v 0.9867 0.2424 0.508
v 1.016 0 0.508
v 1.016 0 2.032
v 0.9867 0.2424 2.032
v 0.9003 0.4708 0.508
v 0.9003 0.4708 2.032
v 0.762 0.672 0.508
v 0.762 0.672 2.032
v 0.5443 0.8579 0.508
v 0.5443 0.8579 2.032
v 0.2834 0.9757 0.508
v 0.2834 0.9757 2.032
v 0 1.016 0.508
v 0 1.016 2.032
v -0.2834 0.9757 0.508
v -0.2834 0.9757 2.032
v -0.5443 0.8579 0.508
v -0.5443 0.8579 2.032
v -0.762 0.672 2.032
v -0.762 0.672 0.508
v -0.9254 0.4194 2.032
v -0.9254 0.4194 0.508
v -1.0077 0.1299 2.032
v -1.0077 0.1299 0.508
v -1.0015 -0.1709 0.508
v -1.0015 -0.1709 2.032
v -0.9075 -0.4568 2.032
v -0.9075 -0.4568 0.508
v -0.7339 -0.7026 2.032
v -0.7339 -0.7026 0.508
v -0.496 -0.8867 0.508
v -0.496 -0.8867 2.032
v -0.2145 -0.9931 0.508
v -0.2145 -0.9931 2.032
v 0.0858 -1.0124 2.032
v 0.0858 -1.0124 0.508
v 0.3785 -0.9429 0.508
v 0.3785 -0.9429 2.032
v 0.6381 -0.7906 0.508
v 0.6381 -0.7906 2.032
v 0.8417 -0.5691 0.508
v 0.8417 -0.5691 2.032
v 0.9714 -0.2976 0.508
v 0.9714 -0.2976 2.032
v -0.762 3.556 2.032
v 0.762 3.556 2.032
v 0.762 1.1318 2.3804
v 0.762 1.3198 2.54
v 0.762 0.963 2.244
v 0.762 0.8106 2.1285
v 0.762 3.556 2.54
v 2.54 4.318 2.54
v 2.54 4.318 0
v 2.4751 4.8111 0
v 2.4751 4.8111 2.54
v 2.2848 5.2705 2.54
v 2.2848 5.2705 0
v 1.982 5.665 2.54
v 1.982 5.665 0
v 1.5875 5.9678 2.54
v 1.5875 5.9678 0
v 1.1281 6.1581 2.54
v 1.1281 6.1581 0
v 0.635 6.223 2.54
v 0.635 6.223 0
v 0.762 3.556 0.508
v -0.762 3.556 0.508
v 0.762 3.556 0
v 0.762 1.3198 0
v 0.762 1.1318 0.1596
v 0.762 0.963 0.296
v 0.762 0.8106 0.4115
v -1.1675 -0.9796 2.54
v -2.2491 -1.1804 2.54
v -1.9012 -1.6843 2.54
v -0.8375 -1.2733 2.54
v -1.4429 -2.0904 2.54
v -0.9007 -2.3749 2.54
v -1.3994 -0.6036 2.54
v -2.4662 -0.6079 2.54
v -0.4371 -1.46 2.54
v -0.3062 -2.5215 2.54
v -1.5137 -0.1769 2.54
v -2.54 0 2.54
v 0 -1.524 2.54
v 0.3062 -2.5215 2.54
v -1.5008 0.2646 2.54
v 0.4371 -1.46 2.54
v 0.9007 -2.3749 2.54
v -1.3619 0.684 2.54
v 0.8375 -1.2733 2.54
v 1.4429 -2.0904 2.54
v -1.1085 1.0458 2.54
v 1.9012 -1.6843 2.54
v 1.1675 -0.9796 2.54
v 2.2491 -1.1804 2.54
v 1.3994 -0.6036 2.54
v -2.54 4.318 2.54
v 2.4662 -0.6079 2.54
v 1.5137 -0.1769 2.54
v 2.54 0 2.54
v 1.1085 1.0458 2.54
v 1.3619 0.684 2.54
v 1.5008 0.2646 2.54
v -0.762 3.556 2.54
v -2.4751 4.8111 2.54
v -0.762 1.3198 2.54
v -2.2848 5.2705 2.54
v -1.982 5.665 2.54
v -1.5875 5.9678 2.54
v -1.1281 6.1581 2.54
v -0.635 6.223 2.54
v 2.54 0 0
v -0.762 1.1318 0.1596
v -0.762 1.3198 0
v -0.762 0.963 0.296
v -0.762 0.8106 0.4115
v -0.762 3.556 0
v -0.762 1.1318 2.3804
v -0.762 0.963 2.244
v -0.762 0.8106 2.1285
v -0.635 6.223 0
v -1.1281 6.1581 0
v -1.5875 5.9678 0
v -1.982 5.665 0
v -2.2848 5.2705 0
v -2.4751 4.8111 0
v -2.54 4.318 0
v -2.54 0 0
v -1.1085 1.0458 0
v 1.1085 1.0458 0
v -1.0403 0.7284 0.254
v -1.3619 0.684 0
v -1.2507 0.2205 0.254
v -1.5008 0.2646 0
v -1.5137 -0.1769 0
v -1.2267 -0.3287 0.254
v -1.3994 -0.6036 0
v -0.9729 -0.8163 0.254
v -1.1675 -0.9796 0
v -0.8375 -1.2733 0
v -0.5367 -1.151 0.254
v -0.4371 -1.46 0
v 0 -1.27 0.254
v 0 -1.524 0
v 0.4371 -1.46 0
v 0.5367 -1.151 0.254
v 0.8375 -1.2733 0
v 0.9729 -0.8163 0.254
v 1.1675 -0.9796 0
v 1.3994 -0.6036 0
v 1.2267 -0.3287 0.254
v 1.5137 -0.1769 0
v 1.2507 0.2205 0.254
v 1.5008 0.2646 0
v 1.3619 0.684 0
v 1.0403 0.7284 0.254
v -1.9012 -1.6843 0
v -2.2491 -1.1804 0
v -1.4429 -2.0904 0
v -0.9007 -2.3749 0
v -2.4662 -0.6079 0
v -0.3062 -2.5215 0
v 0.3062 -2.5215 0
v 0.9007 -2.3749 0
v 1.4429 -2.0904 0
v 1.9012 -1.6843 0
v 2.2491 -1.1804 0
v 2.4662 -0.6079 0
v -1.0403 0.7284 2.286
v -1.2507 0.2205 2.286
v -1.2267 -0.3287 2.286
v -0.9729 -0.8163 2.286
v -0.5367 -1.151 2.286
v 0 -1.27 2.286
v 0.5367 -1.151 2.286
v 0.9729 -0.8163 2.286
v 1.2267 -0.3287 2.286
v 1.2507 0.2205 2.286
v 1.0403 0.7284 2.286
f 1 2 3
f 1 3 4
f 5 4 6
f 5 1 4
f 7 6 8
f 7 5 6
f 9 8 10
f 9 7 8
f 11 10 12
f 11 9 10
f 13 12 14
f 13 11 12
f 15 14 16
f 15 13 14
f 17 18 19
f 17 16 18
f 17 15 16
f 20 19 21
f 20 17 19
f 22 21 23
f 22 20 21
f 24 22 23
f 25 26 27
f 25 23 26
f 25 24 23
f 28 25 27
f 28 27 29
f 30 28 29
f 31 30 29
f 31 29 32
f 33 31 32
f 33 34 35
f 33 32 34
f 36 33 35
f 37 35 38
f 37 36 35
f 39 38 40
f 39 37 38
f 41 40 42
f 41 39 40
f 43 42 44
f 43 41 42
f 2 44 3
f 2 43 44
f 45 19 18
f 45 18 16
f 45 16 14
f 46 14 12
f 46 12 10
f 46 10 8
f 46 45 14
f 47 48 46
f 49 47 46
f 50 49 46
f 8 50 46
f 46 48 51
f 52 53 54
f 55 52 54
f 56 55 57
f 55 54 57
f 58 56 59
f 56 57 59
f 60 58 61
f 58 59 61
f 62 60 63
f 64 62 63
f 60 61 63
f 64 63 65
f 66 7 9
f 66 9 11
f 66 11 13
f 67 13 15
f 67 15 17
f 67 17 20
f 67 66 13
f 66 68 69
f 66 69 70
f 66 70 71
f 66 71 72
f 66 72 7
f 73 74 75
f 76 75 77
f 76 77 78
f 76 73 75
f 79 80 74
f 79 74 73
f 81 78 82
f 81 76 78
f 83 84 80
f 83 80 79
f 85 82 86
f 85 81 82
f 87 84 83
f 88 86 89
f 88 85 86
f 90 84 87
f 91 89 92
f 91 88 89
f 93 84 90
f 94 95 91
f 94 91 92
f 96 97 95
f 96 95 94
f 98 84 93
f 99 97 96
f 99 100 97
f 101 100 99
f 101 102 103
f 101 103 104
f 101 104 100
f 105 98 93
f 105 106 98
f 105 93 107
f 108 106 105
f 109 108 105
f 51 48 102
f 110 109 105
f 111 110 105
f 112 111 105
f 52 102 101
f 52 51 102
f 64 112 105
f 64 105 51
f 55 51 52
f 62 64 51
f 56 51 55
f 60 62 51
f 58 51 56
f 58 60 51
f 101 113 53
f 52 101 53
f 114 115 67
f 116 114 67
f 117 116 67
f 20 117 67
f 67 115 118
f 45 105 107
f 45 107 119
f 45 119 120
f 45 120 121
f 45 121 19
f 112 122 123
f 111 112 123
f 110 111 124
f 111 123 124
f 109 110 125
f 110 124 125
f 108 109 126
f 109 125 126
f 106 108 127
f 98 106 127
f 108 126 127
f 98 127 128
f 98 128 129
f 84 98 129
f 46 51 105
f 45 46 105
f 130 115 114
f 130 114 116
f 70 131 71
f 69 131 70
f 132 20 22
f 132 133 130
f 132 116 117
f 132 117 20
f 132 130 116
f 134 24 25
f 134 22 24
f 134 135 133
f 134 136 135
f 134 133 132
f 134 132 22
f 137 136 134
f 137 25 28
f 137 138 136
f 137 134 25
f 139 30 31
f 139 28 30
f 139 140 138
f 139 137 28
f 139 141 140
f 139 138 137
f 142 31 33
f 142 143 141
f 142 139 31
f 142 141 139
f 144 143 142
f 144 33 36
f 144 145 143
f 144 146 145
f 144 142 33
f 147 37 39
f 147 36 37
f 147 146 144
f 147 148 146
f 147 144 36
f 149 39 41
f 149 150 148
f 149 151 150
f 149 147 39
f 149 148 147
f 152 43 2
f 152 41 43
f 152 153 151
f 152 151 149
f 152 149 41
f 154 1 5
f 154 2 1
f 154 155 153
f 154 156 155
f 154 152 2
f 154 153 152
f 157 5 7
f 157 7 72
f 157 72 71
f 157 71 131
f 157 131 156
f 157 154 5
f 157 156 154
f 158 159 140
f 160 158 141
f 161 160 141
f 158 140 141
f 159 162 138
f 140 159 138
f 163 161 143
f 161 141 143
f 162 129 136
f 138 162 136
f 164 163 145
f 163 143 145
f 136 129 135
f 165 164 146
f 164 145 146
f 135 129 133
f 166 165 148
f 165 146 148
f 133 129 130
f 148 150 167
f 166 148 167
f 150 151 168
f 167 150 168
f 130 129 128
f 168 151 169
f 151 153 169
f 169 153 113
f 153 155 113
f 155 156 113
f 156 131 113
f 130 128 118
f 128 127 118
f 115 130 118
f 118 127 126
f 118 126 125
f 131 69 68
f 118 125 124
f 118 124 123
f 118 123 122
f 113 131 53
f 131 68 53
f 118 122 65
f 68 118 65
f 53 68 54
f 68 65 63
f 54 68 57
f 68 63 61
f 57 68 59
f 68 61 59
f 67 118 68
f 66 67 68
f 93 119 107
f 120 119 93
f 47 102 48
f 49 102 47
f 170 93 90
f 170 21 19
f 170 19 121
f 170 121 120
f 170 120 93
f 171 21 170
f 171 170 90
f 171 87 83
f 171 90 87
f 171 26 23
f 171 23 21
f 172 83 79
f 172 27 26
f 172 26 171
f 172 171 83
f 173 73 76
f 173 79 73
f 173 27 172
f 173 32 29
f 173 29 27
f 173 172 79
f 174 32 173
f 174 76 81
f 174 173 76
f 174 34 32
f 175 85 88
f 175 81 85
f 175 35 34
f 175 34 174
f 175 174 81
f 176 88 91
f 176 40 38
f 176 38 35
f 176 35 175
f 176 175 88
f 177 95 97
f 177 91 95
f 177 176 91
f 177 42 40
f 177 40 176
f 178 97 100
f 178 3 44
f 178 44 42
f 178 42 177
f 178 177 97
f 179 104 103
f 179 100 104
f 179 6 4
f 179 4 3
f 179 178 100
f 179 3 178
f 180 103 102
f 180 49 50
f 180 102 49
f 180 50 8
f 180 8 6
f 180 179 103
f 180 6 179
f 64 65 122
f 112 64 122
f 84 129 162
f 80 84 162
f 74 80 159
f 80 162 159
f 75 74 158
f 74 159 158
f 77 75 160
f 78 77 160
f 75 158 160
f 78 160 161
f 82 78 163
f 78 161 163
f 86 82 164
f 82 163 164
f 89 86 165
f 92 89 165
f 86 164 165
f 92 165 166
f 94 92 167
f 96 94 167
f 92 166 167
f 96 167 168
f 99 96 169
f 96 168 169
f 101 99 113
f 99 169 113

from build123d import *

# Parameters (mm, degrees)
SKETCH2_R           = 1.016
BOSS_EXTRUDE2_DEPTH = 2.54
CUT_EXTRUDE1_DEPTH  = 0.508
CUT_EXTRUDE2_DEPTH  = 0.508


with BuildPart() as part:
    # Sketch2 → Boss-Extrude2 (new body)
    with BuildSketch(Plane.XY):
        with BuildLine():
            ThreePointArc((-2.54, 0), (0, -2.54), (2.54, 0))
            Line((2.54, 0), (2.54, 4.318))
            ThreePointArc((2.54, 4.318), (1.982038418, 5.665038418), (0.635, 6.223))
            Line((0.635, 6.223), (-0.635, 6.223))
            ThreePointArc((-0.635, 6.223), (-1.982038418, 5.665038418), (-2.54, 4.318))
            Line((-2.54, 4.318), (-2.54, 0))
        make_face()
        Circle(SKETCH2_R, mode=Mode.SUBTRACT)
    extrude(amount=BOSS_EXTRUDE2_DEPTH)

    # Sketch3 → Cut-Extrude1 (cut)
    with BuildSketch(Plane.XY.offset(2.54)):
        with BuildLine():
            Line((-0.762, 2.423005572), (-0.762, 1.319822715))
            ThreePointArc((-0.762, 1.319822715), (0, 1.524), (0.762, 1.319822715))
            Line((0.762, 1.319822715), (0.762, 2.423005572))
            ThreePointArc((0.762, 2.423005572), (0, 2.54), (-0.762, 2.423005572))
        make_face()
        with BuildLine():
            Line((-0.762, 3.556), (-0.762, 2.423005572))
            ThreePointArc((-0.762, 2.423005572), (0, 2.54), (0.762, 2.423005572))
            Line((0.762, 2.423005572), (0.762, 3.556))
            Line((0.762, 3.556), (-0.762, 3.556))
        make_face()
        with BuildLine():
            Line((-0.762, 1.319822715), (-0.762, 0.672020833))
            ThreePointArc((-0.762, 0.672020833), (0, 1.016), (0.762, 0.672020833))
            Line((0.762, 0.672020833), (0.762, 1.319822715))
            ThreePointArc((0.762, 1.319822715), (0, 1.524), (-0.762, 1.319822715))
        make_face()
    extrude(amount=-CUT_EXTRUDE1_DEPTH, mode=Mode.SUBTRACT)

    # Sketch4 → Cut-Extrude2 (cut)
    with BuildSketch(Plane(origin=(0, 0, 0), x_dir=(-1, 0, 0), z_dir=(0, 0, -1))):
        with BuildLine():
            ThreePointArc((-0.762, 2.423005572), (0, 2.54), (0.762, 2.423005572))
            Line((0.762, 2.423005572), (0.762, 3.556))
            Line((0.762, 3.556), (-0.762, 3.556))
            Line((-0.762, 3.556), (-0.762, 2.423005572))
        make_face()
        with BuildLine():
            Line((0.762, 1.319822715), (0.762, 2.423005572))
            ThreePointArc((0.762, 2.423005572), (0, 2.54), (-0.762, 2.423005572))
            Line((-0.762, 2.423005572), (-0.762, 1.319822715))
            ThreePointArc((-0.762, 1.319822715), (0, 1.524), (0.762, 1.319822715))
        make_face()
        with BuildLine():
            Line((0.762, 0.672020833), (0.762, 1.319822715))
            ThreePointArc((0.762, 1.319822715), (0, 1.524), (-0.762, 1.319822715))
            Line((-0.762, 1.319822715), (-0.762, 0.672020833))
            ThreePointArc((-0.762, 0.672020833), (0, 1.016), (0.762, 0.672020833))
        make_face()
    extrude(amount=-CUT_EXTRUDE2_DEPTH, mode=Mode.SUBTRACT)

    # Sketch7 → Cut-Revolve1 (revolve, cut)
    with BuildSketch(Plane(origin=(0, 0, 0), x_dir=(1, 0, 0), z_dir=(0, 1, 0))):
        Polygon((0, 0), (0, -2.54), (1.524, -2.54), (0.508, -1.524), (0.508, -1.016), (1.524, 0), align=None)
    revolve(axis=Axis((0, 0, 0), (0, 0, 1)), mode=Mode.SUBTRACT)


solid = part.part
